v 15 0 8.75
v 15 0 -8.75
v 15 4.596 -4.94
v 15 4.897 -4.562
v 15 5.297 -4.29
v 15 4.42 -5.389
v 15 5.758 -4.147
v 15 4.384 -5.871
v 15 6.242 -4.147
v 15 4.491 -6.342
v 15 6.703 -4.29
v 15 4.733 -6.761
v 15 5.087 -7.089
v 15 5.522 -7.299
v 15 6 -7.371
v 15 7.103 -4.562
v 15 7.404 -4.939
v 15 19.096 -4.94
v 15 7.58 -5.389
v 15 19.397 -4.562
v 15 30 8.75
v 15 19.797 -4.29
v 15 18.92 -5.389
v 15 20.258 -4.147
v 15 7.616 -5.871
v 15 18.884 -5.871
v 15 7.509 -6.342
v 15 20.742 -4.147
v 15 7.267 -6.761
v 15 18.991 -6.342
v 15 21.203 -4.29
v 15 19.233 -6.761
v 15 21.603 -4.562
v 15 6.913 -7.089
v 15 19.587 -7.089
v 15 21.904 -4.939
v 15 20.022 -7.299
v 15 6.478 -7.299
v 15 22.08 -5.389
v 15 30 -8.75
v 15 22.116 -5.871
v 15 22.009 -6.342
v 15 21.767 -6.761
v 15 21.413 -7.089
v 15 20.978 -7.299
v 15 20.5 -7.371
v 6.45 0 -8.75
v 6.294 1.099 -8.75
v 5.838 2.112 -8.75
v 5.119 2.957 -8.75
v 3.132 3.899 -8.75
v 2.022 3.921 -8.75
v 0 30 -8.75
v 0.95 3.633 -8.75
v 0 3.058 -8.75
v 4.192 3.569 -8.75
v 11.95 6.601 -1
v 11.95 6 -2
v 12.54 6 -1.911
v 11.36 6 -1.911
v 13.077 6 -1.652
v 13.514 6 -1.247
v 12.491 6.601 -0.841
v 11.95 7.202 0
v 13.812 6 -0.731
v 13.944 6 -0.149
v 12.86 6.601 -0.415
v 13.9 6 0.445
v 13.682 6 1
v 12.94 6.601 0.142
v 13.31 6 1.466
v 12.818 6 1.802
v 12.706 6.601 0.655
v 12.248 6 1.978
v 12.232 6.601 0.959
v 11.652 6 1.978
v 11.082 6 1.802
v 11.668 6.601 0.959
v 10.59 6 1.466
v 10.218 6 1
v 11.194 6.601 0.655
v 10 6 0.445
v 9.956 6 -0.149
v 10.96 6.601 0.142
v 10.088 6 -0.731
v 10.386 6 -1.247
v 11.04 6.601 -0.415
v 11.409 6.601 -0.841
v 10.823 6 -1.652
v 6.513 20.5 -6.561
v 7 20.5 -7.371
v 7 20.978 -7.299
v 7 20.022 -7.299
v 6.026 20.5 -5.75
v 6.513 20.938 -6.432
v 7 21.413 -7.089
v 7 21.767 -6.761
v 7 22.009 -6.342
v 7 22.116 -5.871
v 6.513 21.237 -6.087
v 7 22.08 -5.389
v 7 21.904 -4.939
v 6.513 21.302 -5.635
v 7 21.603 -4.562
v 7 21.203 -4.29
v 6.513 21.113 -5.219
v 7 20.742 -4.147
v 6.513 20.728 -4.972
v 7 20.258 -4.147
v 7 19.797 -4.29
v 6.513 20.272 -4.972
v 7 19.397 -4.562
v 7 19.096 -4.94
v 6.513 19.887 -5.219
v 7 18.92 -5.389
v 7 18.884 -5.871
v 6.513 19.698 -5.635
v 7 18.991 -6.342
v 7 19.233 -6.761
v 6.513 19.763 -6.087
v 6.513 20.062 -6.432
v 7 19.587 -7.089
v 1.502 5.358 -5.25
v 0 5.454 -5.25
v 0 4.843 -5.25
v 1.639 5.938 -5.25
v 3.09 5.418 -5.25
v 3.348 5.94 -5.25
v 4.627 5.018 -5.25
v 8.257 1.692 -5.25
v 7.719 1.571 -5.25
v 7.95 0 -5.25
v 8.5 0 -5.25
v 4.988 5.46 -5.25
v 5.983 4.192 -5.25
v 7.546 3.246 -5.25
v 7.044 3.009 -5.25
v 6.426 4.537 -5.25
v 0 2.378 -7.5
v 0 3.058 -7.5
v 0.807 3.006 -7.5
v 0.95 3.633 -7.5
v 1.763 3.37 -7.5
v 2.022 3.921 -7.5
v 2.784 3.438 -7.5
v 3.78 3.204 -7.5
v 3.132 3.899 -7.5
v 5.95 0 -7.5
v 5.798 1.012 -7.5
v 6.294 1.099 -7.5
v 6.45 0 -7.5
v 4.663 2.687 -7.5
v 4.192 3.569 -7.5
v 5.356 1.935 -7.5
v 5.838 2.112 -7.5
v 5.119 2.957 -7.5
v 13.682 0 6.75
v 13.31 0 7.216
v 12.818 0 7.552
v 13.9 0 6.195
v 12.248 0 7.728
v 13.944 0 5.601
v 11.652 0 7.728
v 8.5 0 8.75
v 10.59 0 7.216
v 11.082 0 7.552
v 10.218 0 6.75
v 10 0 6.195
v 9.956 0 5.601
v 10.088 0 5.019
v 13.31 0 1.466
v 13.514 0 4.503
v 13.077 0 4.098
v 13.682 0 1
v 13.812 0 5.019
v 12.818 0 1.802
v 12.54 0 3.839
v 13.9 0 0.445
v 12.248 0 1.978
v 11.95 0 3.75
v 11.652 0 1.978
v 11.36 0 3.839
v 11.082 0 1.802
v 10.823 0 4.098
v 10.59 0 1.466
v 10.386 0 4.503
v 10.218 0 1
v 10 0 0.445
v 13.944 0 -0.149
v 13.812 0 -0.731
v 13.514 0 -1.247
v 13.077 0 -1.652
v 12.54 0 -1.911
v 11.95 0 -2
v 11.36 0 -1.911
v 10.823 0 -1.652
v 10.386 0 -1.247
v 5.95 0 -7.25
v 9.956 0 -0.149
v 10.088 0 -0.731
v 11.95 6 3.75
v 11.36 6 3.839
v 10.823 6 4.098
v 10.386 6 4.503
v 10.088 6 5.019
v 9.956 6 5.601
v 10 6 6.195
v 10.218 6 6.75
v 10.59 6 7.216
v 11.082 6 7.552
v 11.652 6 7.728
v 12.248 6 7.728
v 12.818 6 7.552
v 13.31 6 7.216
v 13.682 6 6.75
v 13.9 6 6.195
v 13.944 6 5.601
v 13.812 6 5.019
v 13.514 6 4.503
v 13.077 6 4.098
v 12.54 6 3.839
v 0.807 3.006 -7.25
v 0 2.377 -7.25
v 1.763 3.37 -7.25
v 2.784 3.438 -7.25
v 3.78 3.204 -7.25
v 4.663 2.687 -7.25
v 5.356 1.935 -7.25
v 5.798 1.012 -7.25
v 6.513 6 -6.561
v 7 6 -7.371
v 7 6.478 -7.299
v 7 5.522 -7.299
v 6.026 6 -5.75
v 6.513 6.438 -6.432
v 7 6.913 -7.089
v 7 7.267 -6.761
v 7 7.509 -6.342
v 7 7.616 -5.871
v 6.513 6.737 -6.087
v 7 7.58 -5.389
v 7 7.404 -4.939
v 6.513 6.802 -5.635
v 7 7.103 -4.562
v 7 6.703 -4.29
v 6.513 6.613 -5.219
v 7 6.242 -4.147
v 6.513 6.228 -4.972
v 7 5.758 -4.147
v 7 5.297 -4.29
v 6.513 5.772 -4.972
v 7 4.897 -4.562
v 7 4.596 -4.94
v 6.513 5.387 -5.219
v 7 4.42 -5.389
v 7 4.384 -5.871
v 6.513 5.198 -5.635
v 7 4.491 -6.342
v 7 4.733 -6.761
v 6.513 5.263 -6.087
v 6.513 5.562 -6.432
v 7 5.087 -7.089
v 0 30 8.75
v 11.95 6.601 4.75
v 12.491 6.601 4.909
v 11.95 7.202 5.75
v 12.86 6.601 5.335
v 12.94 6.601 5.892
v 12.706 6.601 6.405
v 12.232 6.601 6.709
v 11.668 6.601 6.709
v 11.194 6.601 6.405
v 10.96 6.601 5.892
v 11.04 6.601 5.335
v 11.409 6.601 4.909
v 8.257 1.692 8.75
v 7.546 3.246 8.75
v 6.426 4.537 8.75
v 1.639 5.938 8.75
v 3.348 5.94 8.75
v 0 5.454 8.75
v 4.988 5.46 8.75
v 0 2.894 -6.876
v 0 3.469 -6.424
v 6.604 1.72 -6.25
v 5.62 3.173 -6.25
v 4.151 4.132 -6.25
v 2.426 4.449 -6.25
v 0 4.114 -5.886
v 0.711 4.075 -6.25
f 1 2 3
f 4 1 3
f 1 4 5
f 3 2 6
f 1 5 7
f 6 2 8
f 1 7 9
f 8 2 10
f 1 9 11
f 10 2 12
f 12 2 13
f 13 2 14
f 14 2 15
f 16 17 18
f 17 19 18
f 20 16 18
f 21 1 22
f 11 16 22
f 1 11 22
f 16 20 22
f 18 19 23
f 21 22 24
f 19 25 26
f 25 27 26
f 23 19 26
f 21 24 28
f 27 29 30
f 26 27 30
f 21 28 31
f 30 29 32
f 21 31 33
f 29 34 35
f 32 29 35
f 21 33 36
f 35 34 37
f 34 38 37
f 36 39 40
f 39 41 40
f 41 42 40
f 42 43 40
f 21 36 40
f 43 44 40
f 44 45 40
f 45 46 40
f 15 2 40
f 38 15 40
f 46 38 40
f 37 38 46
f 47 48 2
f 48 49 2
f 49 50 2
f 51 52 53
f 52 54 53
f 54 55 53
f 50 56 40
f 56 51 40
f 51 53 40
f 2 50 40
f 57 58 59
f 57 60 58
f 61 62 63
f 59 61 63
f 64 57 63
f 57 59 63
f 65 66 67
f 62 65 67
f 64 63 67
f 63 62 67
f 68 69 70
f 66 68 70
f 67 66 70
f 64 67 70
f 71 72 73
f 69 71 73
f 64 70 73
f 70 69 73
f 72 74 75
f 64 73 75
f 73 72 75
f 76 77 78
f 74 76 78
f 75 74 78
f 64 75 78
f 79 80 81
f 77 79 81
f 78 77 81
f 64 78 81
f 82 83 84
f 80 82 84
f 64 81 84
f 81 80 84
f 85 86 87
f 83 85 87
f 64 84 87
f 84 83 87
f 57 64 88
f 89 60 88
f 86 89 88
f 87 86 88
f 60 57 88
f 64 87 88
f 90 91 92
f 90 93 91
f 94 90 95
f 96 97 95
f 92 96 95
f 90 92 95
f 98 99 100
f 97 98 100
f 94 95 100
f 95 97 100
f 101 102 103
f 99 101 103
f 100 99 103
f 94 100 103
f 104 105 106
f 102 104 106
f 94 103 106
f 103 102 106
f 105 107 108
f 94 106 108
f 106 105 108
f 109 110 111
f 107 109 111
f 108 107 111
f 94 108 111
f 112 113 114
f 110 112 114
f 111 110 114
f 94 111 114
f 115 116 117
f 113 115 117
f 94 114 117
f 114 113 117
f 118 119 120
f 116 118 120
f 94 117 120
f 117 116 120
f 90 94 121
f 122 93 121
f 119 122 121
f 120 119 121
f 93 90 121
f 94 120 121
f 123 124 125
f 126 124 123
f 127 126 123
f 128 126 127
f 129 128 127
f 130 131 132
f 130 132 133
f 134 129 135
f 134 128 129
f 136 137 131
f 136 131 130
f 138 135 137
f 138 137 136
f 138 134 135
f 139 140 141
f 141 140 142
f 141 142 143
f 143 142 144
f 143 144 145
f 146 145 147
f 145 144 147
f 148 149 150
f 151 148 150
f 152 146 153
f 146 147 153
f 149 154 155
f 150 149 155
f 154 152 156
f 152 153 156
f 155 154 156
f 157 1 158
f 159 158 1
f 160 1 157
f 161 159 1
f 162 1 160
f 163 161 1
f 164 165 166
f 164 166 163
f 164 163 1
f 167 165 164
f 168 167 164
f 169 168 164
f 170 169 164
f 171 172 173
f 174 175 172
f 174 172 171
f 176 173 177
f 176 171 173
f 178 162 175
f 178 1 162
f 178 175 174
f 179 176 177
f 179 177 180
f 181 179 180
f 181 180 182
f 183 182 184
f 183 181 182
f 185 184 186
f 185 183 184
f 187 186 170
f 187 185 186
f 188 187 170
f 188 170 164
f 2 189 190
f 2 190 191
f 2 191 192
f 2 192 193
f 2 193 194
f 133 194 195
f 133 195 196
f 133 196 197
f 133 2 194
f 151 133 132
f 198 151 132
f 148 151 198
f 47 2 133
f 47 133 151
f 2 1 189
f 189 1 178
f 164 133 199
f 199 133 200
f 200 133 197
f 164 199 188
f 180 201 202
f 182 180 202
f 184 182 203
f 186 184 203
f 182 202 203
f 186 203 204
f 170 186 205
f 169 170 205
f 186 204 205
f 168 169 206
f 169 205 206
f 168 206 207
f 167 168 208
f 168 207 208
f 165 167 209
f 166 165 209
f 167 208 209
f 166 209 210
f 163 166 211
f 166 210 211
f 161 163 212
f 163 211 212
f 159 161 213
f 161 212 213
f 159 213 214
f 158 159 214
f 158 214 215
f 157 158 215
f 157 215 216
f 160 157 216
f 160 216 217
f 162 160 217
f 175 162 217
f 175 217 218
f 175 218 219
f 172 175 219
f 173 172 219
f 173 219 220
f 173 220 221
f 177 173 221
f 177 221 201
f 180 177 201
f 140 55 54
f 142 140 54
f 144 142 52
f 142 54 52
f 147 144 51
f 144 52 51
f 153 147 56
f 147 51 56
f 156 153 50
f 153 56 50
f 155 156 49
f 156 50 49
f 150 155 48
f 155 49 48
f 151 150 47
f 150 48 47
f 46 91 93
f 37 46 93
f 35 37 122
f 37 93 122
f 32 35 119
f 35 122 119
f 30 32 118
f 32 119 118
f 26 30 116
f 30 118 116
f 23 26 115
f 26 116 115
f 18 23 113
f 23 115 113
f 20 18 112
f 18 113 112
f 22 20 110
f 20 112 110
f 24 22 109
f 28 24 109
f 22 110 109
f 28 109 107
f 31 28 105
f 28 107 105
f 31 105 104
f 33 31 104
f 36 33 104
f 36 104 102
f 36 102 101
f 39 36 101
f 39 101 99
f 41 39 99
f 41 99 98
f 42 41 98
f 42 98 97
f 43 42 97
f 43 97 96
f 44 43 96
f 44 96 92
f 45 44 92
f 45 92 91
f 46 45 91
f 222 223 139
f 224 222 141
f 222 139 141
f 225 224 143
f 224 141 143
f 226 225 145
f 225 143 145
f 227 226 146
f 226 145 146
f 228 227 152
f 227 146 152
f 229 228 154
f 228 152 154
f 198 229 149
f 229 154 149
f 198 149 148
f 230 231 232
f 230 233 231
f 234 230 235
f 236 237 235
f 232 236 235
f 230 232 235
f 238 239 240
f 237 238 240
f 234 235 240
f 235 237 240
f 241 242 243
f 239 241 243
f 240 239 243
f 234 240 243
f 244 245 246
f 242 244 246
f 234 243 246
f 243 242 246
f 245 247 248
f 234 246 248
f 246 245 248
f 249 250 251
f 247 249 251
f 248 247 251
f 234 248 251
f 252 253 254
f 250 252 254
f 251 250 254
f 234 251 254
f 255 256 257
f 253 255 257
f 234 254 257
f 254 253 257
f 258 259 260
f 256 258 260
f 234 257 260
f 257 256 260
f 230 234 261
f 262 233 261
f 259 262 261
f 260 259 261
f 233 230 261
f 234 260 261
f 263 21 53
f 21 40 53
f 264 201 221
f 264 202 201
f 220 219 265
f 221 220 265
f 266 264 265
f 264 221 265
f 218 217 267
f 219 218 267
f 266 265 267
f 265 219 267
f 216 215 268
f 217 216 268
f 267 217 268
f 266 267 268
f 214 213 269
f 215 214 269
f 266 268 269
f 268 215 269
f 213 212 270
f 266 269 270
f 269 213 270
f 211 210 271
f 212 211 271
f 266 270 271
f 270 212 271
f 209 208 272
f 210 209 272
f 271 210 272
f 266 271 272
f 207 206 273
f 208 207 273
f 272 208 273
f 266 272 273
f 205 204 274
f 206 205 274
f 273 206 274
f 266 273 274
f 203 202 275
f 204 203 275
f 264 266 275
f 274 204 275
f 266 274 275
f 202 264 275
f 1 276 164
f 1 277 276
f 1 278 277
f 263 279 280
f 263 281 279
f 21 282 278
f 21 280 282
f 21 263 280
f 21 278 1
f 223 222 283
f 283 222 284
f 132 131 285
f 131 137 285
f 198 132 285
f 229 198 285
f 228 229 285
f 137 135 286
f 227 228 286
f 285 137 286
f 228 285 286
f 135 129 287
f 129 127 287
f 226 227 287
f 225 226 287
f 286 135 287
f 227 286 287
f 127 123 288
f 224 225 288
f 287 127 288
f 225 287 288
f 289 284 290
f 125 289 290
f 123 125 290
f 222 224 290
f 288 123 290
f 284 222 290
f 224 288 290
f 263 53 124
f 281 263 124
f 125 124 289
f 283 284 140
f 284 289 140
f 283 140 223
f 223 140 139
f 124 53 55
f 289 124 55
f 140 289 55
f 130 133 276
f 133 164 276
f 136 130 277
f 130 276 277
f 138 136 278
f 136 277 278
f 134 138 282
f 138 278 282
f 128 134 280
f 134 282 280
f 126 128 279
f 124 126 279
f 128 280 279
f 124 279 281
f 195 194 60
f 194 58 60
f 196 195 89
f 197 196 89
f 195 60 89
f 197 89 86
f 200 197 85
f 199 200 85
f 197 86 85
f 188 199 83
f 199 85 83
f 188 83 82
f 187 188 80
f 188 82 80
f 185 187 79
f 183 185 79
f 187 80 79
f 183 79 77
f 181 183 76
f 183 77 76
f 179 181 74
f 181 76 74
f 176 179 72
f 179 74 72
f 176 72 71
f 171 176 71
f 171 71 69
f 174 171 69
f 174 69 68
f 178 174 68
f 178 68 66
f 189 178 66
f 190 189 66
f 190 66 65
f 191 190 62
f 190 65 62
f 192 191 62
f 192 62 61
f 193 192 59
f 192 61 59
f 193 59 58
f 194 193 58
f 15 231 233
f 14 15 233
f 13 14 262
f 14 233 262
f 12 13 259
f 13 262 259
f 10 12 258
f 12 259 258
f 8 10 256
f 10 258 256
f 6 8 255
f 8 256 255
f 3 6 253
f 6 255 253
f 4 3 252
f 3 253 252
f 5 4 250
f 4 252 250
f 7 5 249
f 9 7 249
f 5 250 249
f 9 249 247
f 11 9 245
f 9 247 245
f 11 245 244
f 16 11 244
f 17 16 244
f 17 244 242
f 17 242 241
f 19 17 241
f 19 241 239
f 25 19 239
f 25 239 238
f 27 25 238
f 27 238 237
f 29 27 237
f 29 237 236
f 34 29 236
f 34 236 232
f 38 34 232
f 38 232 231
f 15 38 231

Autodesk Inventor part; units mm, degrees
ref_plane "YZ Plane" through (0, 0, 0) normal (1, 0, 0) x (0, 1, 0)
ref_plane "XZ Plane" through (0, 0, 0) normal (0, 1, 0) x (-1, 0, 0)
sketch "Skizze1" plane through (0, 0, 0) normal (0, 0, 1) x (1, 0, 0)
  line L0 (6.45, 0) -> (15, 0)
  line L1 (15, 0) -> (15, 30)
  line L2 (15, 30) -> (0, 30)
  line L3 (0, 30) -> (0, 3.0582)
  arc A0 (6.45, 0) -> (0, 3.0582) centre (2.5, 0) ccw
  line L4 (-3, 0) -> (18, 0) projected
  line L5 (0, -6) -> (0, 36) projected
  point P0 (0, 0)
  dimension "d0" = 30
  dimension "d1" = 15
  dimension "d2" = 7.9
  dimension "d3" = 2.5
extrude "Extrusion1" add sketch "Skizze1" along normal mid plane 17.5 contours A0 L3 L2 L1 L0
ref_plane "Arbeitsebene1" through (0, 0, -7.5) normal (0, 0, 1) x (1, 0, 0)
sketch "Skizze2" plane through (0, 0, -7.5) normal (0, 0, 1) x (1, 0, 0)
  circle A0 centre (2.5, 0) radius 3.95
  arc A1 (6.45, 0) -> (0, 3.0582) centre (2.5, 0) ccw projected
  circle A2 centre (2.5, 0) radius 3.45
  line L0 (0, 3.0582) -> (0, 2.3775)
  line L1 (15, 0) -> (6.45, 0) projected
  line L2 (6.45, 0) -> (5.95, 0)
  point P0 (0, 0)
  point P1 (0, 3.0582)
  dimension "d7" = 7.9
  dimension "d8" = 6.9
extrude "Extrusion2" add sketch "Skizze2" along normal up to surface (16.25 mm away) contours L2 A2 L0 A0 picked at (6.25, 0.2945)
sketch "Skizze3" plane through (15, 0, 8.75) normal (1, 0, 0) x (0, 0, -1)
  line L0 (17.5, 30) -> (17.5, 0) projected
  line L1 (-3.5, 0) -> (21, 0) projected
  point P0 (8.75, 0)
  point P1 (14.5, 20.5)
  point P2 (14.5, 6)
  dimension "d11" = 3
  dimension "d12" = 3
  dimension "d13" = 6
  dimension "d14" = 14.5
hole "Bohrung1" at (15, 20.5, -5.75) at (15, 6, -5.75) direction (-1, 0, 0) diameter 3.242 depth 8 tip angle 118 thread size "M4x0.7" class "6H" standard "ISO Metric profile"
sketch "Skizze4" plane through (6.45, 0, -8.75) normal (0, -1, 0) x (1, 0, 0)
  line L0 (-9.45, 8.75) -> (11.55, 8.75) projected
  line L1 (8.55, 0) -> (8.55, 17.5) projected
  line L2 (8.55, 17.5) -> (-0.5, 17.5) projected
  line L3 (-6.45, 21) -> (-6.45, -3.5) projected
  point P0 (-6.45, 8.75)
  point P1 (5.5, 14.5)
  point P2 (5.5, 8.75)
  dimension "d24" = 3
  dimension "d35" = 11.95
hole "Bohrung2" at (11.95, 0, 5.75) at (11.95, 0, 0) direction (0, 1, 0) diameter 4 depth 6 tip angle 118
sketch "Skizze5" plane through (0, 0, 8.75) normal (0, 0, 1) x (1, 0, 0)
  circle A0 centre (2.5, 0) radius 6
  arc A1 (5.95, 0) -> (0, 2.3775) centre (2.5, 0) ccw projected
  line L0 (0, 2.3775) -> (0, 5.4544)
  line L1 (5.95, 0) -> (8.5, 0)
  line L2 (15, 0) -> (5.95, 0) projected
  point P0 (0, 0)
  dimension "d32" = 12
extrude "Extrusion3" cut sketch "Skizze5" against normal blind 14 contours L1 A1 L0 A0 picked at (7.6008, 0.4409)
chamfer "Fasen1" distance 2 angle 45 1 edges at (3.7801, 3.2037, -5.25)
sketch "Skizze6" plane through (0, 30, 8.75) normal (0, 1, 0) x (1, 0, 0)
  line L0 (0, 17.5) -> (15, 17.5) projected
  line L1 (0, 17.5) -> (0, 0) projected
  point P0 (0, 8.75)
  point P1 (10, 5)
  point P2 (10, 13)
  point P3 (3, 9)
  dimension "d39" = 4.5
  dimension "d40" = 12.5
  dimension "d41" = 8.5
  dimension "d42" = 10
  dimension "d43" = 3
hole "Bohrung3" [suppressed]
hole "Bohrung4" [suppressed]
equation "\"d0\" = Laenge_Grundkoerper"
equation "\"d1\" = Breite_Grundkoerper"
equation "\"d2\" = D_Scheibe"
equation "\"d3\" = Abstand_D_Scheibe"
equation "\"d4\" = Tiefe_Grundkoerper"
equation "\"d7\" = D_Scheibe"
equation "\"d9\" = Tiefe_Grundkoerper"
equation "\"d11\" = Abstand_Bohrungen_y"
equation "\"d12\" = Abstand_Bohrungen_y"
equation "\"d13\" = Abstand_Bohrungen_x"
equation "\"d14\" = Abstand_Bohrungen"
equation "\"d24\" = Zentrierbohrung_y"
equation "\"d25\" = D_Zentrierbohrung"
equation "\"d30\" = T_Zentrierbohrung"
equation "\"Laenge_Grundkoerper\" = 30"
equation "\"Breite_Grundkoerper\" = 15"
equation "\"D_Scheibe\" = 7.9"
equation "\"Abstand_D_Scheibe\" = 2.5"
equation "\"Abstand_Arbeitsebene\" = 2"
equation "\"Tiefe_Grundkoerper\" = 17.5"
equation "\"Abstand_Bohrungen_y\" = 3"
equation "\"Abstand_Bohrungen_x\" = 6"
equation "\"Abstand_Bohrungen\" = 14.5"
equation "\"Zentrierbohrung_x\" = 6"
equation "\"D_Zentrierbohrung\" = 4"
equation "\"T_Zentrierbohrung\" = 6"
equation "\"Zentrierbohrung_y\" = 3"
properties part number "JH_int_Greiferkoerper"
